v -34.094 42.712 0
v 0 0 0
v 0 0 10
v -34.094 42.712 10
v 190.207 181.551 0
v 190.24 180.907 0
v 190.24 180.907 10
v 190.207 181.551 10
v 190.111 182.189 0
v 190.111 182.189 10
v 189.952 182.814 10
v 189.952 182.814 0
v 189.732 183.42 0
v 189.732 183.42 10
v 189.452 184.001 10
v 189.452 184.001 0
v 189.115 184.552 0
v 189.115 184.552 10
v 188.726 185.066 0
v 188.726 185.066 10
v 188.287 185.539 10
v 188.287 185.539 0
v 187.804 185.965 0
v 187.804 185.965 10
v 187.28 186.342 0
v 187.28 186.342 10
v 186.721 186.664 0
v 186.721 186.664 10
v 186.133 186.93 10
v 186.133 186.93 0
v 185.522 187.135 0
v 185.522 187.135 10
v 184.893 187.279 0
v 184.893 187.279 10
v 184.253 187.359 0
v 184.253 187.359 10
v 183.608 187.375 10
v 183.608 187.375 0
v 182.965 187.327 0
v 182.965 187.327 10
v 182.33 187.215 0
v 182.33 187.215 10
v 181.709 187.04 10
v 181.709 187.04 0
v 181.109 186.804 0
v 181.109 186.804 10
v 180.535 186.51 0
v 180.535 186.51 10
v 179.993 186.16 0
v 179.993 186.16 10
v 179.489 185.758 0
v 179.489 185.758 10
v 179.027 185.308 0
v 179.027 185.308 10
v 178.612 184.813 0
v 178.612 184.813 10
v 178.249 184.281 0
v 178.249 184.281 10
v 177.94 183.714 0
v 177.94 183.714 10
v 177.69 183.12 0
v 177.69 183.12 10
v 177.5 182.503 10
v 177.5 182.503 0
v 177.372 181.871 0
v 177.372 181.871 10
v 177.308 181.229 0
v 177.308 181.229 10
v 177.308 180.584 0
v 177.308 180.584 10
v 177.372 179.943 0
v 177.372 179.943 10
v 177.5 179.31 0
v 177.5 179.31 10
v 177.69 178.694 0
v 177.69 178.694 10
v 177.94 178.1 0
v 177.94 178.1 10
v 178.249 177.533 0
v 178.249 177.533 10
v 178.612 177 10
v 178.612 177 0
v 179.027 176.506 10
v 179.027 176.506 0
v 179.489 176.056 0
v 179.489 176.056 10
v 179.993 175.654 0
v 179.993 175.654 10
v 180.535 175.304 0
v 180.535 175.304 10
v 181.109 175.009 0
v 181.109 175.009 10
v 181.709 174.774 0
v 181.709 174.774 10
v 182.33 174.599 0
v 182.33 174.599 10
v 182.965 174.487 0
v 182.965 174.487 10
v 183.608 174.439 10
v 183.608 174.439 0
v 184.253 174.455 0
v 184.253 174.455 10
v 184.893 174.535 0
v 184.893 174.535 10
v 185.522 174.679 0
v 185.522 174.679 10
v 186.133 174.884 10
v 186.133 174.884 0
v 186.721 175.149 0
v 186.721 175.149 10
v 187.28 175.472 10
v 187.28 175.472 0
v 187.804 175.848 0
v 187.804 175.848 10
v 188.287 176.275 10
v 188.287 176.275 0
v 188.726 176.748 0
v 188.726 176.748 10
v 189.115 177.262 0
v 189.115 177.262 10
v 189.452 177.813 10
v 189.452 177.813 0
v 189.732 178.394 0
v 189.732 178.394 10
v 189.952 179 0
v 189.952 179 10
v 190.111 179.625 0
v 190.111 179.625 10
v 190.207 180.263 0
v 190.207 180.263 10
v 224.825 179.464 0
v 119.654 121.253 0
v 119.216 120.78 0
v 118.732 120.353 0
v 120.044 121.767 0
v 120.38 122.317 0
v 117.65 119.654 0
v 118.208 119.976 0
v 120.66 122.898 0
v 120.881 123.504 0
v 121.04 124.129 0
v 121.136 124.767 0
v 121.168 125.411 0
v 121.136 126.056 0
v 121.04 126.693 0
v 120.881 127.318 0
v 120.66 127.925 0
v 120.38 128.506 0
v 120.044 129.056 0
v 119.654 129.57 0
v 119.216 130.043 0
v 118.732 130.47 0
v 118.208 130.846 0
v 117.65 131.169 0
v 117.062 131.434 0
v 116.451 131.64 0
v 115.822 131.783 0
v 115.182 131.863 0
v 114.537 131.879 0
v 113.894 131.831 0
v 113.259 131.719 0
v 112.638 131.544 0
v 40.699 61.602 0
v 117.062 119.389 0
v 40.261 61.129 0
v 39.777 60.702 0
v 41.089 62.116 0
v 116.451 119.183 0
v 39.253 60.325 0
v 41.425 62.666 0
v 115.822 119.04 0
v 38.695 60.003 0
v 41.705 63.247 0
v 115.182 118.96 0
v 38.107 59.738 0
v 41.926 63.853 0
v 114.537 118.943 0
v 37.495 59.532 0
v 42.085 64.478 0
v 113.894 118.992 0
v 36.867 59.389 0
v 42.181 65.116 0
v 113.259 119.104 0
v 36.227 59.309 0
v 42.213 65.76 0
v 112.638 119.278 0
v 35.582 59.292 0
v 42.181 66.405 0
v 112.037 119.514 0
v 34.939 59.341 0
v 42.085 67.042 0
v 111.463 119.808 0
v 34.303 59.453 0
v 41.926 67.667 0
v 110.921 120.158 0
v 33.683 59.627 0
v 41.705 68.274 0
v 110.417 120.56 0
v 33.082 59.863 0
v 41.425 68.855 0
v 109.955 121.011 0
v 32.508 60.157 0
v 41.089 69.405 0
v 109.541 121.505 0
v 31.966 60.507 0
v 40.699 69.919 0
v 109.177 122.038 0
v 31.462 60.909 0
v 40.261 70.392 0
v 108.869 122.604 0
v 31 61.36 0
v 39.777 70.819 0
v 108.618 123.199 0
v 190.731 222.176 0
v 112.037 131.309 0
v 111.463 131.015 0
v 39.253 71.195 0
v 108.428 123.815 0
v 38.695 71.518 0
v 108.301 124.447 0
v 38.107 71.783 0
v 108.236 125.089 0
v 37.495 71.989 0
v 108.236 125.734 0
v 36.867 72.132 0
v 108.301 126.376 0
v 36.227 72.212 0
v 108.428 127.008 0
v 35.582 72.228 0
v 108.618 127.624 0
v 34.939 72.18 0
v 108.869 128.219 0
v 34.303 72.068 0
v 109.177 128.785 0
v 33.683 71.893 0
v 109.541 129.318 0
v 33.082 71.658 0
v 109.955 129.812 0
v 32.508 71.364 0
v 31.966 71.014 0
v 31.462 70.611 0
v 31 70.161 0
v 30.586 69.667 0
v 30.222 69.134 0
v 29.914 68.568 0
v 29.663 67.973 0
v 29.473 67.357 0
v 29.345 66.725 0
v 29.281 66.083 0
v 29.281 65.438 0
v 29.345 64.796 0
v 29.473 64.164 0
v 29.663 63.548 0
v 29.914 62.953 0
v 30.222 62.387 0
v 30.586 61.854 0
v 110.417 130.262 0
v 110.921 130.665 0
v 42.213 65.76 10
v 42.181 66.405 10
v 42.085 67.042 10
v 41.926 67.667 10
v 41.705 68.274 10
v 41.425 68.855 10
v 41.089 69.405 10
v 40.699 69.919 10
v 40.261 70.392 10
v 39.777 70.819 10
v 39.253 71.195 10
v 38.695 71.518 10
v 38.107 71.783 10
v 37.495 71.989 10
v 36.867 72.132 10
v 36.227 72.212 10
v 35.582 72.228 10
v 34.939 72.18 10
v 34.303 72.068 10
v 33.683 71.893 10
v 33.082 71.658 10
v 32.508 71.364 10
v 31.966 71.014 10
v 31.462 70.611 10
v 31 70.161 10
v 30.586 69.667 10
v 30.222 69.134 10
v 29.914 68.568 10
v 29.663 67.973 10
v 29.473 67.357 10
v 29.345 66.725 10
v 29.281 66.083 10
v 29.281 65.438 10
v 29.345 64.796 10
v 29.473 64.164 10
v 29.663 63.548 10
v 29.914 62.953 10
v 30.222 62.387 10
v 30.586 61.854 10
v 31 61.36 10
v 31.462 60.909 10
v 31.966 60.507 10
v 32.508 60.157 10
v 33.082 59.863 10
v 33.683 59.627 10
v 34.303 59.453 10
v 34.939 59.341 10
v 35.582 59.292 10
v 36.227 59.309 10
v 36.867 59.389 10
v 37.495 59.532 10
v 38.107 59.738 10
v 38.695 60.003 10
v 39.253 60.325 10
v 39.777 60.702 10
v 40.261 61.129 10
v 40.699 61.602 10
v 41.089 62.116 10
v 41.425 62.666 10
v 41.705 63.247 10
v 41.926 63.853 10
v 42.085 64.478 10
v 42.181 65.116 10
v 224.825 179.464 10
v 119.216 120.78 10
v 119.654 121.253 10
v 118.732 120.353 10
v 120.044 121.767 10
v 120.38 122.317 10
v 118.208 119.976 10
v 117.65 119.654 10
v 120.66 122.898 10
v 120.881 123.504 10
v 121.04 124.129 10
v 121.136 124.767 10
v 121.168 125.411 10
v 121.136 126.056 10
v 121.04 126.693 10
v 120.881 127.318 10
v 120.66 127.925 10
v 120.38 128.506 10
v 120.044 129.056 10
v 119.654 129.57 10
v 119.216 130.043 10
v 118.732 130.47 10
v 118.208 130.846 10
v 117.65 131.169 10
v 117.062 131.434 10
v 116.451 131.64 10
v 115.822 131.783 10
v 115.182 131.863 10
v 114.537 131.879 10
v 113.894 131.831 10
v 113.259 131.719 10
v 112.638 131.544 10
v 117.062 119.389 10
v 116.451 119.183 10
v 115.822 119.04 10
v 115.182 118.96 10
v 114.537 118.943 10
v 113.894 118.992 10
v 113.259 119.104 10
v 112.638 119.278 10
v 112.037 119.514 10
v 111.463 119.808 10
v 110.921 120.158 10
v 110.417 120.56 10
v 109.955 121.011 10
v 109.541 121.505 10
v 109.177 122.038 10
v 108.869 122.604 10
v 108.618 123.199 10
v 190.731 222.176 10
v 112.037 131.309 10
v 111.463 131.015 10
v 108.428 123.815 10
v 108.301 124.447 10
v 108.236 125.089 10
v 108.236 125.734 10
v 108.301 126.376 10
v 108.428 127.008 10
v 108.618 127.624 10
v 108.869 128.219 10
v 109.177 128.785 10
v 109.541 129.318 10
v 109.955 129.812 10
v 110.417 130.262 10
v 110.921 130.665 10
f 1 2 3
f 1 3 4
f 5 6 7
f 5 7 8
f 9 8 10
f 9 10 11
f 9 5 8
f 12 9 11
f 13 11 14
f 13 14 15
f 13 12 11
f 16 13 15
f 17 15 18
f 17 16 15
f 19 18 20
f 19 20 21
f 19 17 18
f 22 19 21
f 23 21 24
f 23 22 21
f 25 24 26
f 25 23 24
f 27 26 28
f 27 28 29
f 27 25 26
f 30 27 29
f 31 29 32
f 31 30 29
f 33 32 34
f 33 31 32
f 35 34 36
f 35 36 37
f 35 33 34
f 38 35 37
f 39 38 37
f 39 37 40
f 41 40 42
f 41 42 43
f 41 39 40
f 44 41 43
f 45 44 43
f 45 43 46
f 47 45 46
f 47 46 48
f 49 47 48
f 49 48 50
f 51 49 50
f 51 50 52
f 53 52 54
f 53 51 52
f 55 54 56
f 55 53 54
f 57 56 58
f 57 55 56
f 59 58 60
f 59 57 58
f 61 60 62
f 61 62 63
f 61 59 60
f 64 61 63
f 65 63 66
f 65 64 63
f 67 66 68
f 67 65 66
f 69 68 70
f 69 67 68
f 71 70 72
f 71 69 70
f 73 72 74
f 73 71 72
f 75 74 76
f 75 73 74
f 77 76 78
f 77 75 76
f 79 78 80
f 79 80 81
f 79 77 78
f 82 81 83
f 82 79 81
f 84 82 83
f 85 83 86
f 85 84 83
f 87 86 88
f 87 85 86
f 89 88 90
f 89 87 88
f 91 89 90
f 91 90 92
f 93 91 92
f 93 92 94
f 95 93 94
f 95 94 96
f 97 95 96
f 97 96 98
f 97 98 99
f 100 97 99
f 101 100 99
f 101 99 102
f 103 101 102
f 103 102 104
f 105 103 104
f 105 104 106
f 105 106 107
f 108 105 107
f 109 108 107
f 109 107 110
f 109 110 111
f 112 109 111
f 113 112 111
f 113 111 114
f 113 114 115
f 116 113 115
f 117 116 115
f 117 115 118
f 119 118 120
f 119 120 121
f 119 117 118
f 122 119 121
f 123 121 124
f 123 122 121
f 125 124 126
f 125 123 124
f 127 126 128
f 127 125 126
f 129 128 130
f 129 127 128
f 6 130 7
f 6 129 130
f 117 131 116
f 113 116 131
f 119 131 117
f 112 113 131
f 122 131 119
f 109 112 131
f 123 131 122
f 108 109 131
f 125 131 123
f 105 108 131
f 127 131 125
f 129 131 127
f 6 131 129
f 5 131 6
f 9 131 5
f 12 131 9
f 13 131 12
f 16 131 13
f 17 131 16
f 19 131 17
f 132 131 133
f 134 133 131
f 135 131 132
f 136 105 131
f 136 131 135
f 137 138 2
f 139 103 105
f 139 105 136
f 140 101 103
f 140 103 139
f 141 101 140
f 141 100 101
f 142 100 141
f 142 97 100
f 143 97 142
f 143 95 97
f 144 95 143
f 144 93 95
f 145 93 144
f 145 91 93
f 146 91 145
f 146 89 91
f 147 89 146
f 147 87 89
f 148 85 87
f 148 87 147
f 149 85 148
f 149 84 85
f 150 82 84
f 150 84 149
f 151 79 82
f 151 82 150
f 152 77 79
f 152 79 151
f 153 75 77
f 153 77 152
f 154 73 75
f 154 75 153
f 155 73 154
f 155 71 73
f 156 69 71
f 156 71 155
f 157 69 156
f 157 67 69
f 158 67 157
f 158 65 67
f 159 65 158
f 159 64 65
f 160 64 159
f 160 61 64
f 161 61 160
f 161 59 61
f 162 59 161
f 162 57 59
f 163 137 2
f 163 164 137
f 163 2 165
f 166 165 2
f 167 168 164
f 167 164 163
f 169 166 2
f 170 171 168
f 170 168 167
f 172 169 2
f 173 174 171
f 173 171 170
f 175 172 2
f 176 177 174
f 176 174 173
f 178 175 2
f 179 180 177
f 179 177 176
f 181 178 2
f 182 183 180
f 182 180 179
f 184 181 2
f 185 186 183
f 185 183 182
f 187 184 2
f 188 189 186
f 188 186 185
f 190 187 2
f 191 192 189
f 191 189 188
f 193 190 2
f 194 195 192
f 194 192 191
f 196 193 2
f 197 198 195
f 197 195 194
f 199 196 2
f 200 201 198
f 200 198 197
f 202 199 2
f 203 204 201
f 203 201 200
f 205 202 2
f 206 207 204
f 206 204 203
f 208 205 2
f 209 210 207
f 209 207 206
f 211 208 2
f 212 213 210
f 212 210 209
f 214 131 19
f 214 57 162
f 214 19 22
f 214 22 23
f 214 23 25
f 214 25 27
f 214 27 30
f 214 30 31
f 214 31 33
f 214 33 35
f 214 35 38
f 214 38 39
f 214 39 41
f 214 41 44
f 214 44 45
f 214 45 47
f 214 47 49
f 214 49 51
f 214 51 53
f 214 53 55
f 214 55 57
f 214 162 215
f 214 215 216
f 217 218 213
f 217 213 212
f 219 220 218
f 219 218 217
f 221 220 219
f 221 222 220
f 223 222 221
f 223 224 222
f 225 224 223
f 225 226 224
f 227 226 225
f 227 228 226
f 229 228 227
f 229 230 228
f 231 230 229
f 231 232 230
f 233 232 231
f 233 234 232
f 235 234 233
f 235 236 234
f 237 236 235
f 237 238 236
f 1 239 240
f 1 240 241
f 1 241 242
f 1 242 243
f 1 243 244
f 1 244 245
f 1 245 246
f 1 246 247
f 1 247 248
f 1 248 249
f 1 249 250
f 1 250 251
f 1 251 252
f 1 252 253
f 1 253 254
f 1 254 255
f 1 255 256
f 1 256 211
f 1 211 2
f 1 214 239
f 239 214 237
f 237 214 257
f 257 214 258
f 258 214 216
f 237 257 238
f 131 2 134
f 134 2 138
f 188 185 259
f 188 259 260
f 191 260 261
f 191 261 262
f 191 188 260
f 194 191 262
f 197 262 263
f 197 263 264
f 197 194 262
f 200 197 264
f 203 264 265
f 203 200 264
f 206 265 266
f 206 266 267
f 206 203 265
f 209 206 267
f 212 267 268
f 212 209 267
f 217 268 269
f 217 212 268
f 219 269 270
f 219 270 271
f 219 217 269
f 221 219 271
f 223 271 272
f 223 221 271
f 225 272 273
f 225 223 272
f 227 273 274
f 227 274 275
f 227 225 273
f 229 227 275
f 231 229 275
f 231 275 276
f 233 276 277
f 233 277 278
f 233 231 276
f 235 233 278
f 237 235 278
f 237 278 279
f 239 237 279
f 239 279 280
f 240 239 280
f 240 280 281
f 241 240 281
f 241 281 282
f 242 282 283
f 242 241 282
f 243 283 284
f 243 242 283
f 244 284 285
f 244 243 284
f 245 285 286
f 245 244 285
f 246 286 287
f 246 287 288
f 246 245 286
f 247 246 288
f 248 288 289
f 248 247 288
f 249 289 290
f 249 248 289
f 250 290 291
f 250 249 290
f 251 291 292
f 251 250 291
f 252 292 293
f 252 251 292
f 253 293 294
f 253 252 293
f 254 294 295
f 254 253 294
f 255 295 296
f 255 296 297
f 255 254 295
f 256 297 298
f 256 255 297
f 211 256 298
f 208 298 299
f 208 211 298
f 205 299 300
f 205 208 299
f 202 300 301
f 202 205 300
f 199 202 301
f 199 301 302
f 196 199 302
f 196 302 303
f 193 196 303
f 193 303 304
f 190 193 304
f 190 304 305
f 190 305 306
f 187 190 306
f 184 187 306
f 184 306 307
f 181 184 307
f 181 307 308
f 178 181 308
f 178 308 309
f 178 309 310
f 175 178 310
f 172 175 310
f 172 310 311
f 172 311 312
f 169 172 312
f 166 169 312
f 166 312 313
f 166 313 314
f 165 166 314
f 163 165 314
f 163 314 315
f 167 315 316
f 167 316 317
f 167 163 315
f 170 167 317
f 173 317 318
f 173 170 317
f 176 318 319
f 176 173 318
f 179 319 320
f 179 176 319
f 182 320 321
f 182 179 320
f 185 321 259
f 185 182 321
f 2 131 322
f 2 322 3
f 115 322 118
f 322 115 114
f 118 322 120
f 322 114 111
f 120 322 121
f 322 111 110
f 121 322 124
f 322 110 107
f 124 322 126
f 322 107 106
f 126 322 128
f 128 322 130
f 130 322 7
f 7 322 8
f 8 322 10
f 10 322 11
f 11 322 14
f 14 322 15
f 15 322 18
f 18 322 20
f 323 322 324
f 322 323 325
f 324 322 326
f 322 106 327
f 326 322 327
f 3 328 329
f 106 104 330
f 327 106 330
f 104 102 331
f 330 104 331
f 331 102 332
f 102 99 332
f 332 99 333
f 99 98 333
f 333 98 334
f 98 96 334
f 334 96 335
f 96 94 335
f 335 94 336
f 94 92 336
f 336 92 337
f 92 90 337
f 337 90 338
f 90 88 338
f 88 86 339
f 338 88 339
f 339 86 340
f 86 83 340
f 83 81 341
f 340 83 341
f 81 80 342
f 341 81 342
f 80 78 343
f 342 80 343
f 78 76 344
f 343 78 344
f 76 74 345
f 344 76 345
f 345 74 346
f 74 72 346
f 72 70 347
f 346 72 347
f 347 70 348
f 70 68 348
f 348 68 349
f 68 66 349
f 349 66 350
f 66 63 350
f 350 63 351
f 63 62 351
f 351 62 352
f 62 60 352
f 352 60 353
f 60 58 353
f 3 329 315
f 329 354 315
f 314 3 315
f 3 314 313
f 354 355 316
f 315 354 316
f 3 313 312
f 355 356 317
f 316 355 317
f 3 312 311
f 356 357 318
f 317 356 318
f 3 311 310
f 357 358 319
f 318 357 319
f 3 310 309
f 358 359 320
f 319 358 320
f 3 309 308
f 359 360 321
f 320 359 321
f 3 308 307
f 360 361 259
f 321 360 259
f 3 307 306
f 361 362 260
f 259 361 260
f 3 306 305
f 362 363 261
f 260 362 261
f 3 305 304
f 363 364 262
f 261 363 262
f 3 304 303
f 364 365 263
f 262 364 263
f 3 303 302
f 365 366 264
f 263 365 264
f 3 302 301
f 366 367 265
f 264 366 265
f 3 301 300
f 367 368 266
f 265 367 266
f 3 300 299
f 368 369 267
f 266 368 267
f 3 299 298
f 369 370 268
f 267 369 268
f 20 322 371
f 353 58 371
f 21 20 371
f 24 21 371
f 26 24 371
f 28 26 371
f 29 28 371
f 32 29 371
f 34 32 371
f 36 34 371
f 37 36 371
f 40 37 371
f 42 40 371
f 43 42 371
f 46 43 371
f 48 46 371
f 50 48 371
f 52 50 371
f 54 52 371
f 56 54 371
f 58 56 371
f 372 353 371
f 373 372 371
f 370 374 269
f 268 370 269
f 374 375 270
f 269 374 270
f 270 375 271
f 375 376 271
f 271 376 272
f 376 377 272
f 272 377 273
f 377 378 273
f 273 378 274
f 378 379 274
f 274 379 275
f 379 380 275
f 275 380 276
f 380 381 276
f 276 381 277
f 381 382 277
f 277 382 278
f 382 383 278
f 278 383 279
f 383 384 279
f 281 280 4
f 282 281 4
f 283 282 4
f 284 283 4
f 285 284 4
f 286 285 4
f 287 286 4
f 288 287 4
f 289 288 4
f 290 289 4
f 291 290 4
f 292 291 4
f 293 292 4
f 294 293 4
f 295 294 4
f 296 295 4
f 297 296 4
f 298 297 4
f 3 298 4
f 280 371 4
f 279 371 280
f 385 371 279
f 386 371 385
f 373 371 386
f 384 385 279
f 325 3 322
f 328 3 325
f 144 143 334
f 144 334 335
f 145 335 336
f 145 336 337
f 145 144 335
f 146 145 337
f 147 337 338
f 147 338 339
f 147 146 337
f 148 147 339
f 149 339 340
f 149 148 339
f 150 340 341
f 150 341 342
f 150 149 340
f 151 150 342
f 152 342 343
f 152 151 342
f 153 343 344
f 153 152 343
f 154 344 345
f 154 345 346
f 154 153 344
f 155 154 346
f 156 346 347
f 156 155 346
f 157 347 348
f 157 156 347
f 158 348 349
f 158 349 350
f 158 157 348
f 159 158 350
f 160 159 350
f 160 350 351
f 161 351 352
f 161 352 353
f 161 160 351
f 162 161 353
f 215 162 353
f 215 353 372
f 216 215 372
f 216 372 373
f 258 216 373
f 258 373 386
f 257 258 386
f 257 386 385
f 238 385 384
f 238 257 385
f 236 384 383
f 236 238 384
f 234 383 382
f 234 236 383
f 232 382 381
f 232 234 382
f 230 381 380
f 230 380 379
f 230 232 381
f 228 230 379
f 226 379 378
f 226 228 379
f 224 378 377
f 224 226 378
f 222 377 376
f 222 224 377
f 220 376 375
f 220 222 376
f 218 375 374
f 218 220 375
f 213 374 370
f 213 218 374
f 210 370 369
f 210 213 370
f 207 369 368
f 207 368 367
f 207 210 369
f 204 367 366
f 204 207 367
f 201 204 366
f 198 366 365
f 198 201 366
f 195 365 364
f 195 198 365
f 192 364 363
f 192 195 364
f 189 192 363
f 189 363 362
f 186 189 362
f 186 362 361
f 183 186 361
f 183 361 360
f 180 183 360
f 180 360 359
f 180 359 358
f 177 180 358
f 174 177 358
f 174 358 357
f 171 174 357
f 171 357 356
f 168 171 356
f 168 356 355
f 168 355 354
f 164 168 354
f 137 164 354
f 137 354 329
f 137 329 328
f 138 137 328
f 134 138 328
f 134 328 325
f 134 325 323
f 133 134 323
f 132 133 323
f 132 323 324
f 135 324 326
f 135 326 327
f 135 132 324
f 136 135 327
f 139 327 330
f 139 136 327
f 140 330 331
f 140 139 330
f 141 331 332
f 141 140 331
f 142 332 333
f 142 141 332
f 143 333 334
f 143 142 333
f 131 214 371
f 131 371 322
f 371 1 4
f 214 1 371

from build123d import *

# Parameters (mm, degrees)
SKETCH1_R           = 6.469950333
BOSS_EXTRUDE1_DEPTH = 10


with BuildPart() as part:
    # Sketch1 → Boss-Extrude1 (new body)
    with BuildSketch(Plane.XY):
        Polygon((0, 0), (-34.094374575, 42.711992732), (190.731046947, 222.176392423), (224.825421522, 179.464399691), align=None)
        with Locations((35.743173778, 65.760421737)):
            Circle(SKETCH1_R, mode=Mode.SUBTRACT)
        with Locations((114.698226452, 125.411384111)):
            Circle(SKETCH1_R, mode=Mode.SUBTRACT)
        with Locations((183.769608582, 180.906879578)):
            Circle(SKETCH1_R, mode=Mode.SUBTRACT)
    extrude(amount=BOSS_EXTRUDE1_DEPTH)


solid = part.part
